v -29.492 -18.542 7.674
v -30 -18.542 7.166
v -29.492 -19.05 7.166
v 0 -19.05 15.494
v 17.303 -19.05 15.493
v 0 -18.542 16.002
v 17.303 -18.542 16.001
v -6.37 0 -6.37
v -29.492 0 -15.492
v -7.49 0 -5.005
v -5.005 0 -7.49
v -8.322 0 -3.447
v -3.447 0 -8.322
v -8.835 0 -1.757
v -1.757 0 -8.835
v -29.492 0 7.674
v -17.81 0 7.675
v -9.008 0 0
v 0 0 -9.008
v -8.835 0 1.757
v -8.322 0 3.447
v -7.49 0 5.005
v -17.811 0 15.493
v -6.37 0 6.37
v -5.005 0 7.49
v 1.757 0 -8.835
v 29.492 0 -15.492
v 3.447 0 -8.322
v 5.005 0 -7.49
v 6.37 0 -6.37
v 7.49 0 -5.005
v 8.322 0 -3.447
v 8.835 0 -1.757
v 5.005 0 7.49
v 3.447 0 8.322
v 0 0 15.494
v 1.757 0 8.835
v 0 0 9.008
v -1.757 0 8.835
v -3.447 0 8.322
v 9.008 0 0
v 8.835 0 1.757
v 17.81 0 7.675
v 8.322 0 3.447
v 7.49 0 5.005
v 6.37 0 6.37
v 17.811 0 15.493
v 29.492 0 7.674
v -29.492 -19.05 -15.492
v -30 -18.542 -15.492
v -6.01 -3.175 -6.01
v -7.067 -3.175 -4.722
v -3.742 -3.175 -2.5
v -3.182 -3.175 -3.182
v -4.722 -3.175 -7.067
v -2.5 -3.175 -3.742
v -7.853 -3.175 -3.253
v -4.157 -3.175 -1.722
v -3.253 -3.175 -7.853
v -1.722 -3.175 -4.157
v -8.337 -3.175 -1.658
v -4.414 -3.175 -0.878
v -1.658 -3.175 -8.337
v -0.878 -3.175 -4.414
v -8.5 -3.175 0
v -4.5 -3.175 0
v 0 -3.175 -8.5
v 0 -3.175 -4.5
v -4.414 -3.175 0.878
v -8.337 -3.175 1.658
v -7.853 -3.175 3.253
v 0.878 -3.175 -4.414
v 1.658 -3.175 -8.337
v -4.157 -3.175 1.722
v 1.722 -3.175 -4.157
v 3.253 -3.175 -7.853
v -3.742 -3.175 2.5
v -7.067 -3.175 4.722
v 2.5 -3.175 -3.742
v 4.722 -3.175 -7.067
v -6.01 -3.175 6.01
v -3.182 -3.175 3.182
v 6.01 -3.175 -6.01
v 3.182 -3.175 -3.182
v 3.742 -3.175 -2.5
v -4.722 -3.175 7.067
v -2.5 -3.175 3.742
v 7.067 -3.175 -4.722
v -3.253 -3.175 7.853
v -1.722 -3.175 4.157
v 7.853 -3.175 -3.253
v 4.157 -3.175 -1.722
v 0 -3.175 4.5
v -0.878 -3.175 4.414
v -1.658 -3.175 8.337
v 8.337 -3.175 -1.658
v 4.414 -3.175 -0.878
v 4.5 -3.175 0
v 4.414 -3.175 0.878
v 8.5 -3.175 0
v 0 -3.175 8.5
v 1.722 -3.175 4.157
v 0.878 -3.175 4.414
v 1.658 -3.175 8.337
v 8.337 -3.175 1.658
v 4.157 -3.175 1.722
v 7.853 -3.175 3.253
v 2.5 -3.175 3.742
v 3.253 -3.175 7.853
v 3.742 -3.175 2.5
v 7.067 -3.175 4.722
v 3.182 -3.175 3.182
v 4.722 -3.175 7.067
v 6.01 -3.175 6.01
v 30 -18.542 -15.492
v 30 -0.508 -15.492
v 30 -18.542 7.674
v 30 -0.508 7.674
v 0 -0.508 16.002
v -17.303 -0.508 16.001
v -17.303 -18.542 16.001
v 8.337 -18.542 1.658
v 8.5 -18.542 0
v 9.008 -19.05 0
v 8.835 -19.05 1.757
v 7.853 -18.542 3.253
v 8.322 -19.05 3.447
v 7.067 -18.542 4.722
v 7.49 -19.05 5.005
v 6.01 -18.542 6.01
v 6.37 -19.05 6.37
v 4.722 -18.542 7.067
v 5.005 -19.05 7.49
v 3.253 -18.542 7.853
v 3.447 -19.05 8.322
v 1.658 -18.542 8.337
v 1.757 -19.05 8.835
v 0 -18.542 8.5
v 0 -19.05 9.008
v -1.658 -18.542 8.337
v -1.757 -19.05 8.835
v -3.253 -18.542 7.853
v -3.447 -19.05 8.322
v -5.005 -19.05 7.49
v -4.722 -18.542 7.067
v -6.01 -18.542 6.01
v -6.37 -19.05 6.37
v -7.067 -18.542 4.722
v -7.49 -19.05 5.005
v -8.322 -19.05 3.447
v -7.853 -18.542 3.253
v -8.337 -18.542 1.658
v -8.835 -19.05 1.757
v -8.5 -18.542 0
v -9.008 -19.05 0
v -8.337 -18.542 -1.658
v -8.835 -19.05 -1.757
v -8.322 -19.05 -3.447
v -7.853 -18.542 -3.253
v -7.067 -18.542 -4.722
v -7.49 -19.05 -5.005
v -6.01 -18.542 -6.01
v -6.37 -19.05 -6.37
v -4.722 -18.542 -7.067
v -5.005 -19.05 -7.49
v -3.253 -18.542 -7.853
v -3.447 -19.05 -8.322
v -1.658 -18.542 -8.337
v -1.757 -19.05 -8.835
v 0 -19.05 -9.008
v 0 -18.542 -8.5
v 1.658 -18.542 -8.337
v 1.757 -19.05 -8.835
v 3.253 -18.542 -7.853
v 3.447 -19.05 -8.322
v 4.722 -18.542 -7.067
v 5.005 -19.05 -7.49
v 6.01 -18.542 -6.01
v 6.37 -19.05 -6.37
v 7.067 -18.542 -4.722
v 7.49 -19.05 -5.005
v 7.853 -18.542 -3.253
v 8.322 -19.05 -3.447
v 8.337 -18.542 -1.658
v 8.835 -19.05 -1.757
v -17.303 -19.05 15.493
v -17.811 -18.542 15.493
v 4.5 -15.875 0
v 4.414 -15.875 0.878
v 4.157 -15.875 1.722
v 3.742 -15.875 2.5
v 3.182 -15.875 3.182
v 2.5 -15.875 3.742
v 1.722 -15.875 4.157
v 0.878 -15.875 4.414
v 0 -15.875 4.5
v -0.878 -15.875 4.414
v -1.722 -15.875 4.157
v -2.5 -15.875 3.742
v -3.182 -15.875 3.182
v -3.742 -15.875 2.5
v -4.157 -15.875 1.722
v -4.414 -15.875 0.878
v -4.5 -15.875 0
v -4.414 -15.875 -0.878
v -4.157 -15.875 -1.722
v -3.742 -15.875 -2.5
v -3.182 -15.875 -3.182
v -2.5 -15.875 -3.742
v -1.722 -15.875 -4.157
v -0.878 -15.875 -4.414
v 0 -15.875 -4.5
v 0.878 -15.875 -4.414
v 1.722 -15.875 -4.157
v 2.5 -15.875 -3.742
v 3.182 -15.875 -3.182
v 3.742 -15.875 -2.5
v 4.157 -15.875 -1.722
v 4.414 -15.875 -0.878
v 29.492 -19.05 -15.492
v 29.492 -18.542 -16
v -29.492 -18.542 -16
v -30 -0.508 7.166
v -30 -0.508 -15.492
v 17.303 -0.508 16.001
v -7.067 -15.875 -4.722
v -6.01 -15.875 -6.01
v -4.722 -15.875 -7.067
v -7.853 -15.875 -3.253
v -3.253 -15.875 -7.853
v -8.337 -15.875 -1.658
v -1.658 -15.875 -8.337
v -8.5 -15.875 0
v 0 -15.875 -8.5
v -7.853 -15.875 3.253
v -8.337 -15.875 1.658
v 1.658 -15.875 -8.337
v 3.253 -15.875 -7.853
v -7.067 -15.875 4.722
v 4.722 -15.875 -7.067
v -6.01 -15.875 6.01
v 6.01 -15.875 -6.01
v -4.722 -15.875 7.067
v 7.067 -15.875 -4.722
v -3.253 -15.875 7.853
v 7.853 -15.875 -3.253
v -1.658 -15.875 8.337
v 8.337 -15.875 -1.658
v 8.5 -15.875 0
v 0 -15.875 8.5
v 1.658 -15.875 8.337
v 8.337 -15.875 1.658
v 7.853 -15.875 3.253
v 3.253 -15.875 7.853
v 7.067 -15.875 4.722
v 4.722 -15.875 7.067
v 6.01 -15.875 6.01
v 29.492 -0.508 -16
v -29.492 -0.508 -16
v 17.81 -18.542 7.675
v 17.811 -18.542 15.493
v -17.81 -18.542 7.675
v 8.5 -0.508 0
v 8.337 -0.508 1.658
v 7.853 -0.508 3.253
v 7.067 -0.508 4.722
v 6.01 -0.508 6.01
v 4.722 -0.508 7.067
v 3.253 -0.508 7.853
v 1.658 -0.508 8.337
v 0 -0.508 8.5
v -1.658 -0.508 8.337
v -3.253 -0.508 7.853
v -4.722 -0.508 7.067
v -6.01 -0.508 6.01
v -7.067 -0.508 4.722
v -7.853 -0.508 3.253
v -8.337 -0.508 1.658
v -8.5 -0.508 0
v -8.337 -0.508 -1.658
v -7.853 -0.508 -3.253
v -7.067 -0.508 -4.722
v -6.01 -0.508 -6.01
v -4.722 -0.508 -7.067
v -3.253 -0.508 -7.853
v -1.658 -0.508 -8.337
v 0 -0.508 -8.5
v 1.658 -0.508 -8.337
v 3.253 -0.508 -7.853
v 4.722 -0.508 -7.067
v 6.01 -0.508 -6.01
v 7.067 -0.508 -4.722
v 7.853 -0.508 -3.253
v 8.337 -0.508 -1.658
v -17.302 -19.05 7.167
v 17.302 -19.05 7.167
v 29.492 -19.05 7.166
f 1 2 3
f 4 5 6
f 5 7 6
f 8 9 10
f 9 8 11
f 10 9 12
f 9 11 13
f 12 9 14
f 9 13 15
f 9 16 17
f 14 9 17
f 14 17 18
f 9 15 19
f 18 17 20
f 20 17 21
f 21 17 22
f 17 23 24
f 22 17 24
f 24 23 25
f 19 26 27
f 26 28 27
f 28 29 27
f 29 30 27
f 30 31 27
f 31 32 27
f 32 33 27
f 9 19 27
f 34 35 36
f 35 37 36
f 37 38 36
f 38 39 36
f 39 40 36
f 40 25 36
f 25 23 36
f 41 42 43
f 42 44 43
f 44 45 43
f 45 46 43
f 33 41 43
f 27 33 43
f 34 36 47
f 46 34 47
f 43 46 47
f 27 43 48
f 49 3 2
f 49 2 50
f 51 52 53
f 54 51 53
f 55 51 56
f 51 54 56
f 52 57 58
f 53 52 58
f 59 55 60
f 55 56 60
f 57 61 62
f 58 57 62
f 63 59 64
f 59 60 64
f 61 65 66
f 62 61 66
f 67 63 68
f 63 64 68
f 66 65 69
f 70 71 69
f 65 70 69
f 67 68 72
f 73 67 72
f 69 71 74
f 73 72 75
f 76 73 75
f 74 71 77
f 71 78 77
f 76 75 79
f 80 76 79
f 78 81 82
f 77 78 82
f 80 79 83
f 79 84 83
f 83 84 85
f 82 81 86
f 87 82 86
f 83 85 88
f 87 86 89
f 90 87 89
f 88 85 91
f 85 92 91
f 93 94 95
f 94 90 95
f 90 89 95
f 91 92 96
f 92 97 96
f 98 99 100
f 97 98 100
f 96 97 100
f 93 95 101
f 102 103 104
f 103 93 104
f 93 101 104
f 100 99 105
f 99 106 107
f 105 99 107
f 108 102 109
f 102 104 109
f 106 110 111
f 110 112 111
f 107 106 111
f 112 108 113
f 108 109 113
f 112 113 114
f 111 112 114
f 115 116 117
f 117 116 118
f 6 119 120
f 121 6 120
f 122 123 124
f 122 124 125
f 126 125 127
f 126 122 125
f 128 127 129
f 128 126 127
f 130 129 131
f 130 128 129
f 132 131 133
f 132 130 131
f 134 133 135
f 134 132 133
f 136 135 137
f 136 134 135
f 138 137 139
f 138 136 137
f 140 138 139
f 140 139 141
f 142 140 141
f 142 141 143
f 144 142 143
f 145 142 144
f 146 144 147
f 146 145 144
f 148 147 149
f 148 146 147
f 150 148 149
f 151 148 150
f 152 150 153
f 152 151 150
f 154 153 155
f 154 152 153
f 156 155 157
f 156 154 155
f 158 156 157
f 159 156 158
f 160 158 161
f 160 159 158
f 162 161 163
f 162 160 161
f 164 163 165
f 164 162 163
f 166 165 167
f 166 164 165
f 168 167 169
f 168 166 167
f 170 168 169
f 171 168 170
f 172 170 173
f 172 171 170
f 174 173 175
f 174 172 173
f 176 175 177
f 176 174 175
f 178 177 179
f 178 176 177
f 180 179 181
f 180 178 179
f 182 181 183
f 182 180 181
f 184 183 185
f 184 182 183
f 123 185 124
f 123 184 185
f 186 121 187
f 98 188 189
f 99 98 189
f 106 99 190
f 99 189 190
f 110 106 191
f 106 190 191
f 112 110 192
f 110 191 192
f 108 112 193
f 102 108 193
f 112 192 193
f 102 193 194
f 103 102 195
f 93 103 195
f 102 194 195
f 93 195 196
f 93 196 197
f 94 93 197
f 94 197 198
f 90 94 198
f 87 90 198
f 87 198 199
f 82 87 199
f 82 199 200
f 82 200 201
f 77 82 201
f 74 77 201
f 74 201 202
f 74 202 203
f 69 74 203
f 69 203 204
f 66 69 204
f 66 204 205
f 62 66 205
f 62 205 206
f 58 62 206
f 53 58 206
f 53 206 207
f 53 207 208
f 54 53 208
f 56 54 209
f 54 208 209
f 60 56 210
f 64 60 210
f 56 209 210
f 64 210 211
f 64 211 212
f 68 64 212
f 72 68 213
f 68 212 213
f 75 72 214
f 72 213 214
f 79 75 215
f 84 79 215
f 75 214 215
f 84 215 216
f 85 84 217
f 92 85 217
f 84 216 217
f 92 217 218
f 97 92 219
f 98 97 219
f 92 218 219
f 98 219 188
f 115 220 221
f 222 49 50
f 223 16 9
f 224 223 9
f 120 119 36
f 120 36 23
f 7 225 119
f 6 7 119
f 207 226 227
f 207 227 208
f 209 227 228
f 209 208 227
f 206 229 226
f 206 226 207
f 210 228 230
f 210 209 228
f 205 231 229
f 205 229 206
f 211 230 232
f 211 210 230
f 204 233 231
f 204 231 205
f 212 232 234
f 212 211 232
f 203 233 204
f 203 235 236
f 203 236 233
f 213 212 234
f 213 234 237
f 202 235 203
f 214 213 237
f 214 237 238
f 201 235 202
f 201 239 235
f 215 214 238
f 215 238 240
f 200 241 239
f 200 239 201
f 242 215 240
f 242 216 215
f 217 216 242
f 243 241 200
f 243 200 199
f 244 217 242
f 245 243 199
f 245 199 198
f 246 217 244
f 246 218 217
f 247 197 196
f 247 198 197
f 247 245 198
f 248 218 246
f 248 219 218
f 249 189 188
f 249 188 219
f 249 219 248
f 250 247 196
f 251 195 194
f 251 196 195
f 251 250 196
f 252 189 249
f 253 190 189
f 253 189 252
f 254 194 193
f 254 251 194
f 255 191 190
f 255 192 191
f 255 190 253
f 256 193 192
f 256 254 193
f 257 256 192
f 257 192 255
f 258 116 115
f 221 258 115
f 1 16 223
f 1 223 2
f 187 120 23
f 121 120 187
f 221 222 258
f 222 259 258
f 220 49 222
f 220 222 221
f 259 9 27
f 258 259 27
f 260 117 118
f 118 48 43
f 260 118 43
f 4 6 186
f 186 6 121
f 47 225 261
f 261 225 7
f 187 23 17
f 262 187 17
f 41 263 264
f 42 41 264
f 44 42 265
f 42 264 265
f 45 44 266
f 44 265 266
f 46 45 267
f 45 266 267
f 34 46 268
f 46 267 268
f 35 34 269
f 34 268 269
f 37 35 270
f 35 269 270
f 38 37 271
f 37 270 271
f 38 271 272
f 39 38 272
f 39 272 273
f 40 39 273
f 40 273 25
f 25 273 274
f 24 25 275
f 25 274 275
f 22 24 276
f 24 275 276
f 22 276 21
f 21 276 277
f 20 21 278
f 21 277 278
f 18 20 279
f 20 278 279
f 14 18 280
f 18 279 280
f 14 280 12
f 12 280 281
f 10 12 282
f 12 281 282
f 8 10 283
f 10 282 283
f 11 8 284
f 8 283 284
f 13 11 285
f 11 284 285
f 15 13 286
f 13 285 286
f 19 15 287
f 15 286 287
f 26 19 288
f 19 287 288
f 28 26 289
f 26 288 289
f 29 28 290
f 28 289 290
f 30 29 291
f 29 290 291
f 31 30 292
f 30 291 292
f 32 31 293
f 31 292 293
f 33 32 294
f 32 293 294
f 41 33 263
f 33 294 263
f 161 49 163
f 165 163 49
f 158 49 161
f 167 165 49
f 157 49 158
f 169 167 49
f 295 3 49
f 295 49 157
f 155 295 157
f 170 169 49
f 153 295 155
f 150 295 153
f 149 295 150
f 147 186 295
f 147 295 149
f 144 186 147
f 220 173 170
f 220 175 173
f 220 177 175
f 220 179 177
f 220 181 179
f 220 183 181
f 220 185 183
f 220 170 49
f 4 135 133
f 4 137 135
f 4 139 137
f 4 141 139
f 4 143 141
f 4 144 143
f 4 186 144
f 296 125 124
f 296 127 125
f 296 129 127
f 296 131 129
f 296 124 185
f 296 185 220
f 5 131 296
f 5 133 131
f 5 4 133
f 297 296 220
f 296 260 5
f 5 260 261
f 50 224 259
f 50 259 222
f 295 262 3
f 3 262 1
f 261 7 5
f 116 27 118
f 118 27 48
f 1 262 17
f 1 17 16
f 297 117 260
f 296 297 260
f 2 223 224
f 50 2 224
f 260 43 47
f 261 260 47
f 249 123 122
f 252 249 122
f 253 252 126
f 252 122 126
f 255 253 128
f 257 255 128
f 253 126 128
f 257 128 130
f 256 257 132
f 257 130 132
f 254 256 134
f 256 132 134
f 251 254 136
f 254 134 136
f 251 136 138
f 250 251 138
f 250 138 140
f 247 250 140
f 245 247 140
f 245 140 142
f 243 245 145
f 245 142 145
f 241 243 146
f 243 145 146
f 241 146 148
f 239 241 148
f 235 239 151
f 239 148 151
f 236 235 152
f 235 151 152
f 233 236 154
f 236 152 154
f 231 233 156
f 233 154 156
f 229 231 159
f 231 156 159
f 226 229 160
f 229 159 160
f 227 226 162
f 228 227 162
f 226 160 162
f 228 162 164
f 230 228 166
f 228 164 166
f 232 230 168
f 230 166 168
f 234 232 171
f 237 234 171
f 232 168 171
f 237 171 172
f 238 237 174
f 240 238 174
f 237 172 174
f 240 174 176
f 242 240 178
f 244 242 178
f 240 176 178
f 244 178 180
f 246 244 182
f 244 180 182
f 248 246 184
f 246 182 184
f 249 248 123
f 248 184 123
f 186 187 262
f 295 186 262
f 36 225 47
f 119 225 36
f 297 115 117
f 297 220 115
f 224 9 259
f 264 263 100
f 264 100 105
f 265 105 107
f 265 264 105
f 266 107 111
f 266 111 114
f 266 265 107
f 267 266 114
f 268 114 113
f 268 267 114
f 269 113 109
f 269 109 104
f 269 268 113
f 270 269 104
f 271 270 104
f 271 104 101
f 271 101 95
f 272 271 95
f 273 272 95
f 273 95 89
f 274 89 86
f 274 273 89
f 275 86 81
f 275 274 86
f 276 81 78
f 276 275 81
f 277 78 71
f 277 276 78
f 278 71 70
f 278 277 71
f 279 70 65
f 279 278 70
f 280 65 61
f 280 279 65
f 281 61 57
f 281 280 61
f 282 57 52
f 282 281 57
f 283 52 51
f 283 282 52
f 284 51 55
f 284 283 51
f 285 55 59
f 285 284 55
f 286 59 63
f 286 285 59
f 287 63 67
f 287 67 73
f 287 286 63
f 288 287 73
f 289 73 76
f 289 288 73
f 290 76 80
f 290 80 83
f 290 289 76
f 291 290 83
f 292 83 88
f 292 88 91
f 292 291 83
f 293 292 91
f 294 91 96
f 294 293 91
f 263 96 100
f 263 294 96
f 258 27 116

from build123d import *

# Parameters (mm, degrees)
F1_DEPTH = 19.05
F2_R     = 8.5
F3_DEPTH = 3.175
F4_R     = 4.5
F5_DEPTH = 15.875
F6_R     = 8.5
F7_DEPTH = 3.175
F8_SIZE  = 0.508


with BuildPart() as f1:
    # F0 (on Front) → F1 (new body)
    with BuildSketch(Plane.XZ):
        Polygon((-30, -16), (0, -16), (30, -16), (30, 7.6738381025), (17.8103312015, 7.6746507471), (17.810886279, 16.0008126076), (0, 16.002), (-17.810886279, 16.0008126076), (-17.8103312015, 7.6746507471), (-30, 7.6738381025), align=None)
    extrude(amount=F1_DEPTH)

    # F2 (on face) → F3 (cut)
    with BuildSketch(Plane.XZ.offset(19.05)):
        Circle(F2_R)
    extrude(amount=-F3_DEPTH, mode=Mode.SUBTRACT)

    # F4 (on face) → F5 (cut, through all)
    with BuildSketch(Plane.XZ.offset(15.875)):
        Circle(F4_R)
    extrude(amount=-F5_DEPTH, mode=Mode.SUBTRACT)

    # F6 (on Front) → F7 (cut)
    with BuildSketch(Plane.XZ):
        Circle(F6_R)
    extrude(amount=F7_DEPTH, mode=Mode.SUBTRACT)

    # F8
    f8_edges = [f1.edges().sort_by_distance(p)[0] for p in [
        (-30, -9.525, 7.673838),
        (-17.810886, -9.525, 16.000813),
        (-30, -19.05, -4.163081),
        (-8.905443, -19.05, 16.001406),
        (8.905443, -19.05, 16.001406),
        (23.905166, -19.05, 7.674244),
        (30, -19.05, -4.163081),
        (0, -19.05, -16),
        (-8.905443, 0, 16.001406),
        (8.905443, 0, 16.001406),
        (17.810886, -9.525, 16.000813),
        (-30, 0, -4.163081),
        (30, 0, -4.163081),
        (0, 0, -16),
        (30, -9.525, -16),
        (-30, -9.525, -16),
        (-8.5, 0, 0),
        (-23.905166, -19.05, 7.674244),
        (-17.810609, -19.05, 11.837732),
        (17.810609, -19.05, 11.837732),
        (-8.5, -19.05, 0),
    ]]
    chamfer(f8_edges, length=F8_SIZE)


solid = f1.part
